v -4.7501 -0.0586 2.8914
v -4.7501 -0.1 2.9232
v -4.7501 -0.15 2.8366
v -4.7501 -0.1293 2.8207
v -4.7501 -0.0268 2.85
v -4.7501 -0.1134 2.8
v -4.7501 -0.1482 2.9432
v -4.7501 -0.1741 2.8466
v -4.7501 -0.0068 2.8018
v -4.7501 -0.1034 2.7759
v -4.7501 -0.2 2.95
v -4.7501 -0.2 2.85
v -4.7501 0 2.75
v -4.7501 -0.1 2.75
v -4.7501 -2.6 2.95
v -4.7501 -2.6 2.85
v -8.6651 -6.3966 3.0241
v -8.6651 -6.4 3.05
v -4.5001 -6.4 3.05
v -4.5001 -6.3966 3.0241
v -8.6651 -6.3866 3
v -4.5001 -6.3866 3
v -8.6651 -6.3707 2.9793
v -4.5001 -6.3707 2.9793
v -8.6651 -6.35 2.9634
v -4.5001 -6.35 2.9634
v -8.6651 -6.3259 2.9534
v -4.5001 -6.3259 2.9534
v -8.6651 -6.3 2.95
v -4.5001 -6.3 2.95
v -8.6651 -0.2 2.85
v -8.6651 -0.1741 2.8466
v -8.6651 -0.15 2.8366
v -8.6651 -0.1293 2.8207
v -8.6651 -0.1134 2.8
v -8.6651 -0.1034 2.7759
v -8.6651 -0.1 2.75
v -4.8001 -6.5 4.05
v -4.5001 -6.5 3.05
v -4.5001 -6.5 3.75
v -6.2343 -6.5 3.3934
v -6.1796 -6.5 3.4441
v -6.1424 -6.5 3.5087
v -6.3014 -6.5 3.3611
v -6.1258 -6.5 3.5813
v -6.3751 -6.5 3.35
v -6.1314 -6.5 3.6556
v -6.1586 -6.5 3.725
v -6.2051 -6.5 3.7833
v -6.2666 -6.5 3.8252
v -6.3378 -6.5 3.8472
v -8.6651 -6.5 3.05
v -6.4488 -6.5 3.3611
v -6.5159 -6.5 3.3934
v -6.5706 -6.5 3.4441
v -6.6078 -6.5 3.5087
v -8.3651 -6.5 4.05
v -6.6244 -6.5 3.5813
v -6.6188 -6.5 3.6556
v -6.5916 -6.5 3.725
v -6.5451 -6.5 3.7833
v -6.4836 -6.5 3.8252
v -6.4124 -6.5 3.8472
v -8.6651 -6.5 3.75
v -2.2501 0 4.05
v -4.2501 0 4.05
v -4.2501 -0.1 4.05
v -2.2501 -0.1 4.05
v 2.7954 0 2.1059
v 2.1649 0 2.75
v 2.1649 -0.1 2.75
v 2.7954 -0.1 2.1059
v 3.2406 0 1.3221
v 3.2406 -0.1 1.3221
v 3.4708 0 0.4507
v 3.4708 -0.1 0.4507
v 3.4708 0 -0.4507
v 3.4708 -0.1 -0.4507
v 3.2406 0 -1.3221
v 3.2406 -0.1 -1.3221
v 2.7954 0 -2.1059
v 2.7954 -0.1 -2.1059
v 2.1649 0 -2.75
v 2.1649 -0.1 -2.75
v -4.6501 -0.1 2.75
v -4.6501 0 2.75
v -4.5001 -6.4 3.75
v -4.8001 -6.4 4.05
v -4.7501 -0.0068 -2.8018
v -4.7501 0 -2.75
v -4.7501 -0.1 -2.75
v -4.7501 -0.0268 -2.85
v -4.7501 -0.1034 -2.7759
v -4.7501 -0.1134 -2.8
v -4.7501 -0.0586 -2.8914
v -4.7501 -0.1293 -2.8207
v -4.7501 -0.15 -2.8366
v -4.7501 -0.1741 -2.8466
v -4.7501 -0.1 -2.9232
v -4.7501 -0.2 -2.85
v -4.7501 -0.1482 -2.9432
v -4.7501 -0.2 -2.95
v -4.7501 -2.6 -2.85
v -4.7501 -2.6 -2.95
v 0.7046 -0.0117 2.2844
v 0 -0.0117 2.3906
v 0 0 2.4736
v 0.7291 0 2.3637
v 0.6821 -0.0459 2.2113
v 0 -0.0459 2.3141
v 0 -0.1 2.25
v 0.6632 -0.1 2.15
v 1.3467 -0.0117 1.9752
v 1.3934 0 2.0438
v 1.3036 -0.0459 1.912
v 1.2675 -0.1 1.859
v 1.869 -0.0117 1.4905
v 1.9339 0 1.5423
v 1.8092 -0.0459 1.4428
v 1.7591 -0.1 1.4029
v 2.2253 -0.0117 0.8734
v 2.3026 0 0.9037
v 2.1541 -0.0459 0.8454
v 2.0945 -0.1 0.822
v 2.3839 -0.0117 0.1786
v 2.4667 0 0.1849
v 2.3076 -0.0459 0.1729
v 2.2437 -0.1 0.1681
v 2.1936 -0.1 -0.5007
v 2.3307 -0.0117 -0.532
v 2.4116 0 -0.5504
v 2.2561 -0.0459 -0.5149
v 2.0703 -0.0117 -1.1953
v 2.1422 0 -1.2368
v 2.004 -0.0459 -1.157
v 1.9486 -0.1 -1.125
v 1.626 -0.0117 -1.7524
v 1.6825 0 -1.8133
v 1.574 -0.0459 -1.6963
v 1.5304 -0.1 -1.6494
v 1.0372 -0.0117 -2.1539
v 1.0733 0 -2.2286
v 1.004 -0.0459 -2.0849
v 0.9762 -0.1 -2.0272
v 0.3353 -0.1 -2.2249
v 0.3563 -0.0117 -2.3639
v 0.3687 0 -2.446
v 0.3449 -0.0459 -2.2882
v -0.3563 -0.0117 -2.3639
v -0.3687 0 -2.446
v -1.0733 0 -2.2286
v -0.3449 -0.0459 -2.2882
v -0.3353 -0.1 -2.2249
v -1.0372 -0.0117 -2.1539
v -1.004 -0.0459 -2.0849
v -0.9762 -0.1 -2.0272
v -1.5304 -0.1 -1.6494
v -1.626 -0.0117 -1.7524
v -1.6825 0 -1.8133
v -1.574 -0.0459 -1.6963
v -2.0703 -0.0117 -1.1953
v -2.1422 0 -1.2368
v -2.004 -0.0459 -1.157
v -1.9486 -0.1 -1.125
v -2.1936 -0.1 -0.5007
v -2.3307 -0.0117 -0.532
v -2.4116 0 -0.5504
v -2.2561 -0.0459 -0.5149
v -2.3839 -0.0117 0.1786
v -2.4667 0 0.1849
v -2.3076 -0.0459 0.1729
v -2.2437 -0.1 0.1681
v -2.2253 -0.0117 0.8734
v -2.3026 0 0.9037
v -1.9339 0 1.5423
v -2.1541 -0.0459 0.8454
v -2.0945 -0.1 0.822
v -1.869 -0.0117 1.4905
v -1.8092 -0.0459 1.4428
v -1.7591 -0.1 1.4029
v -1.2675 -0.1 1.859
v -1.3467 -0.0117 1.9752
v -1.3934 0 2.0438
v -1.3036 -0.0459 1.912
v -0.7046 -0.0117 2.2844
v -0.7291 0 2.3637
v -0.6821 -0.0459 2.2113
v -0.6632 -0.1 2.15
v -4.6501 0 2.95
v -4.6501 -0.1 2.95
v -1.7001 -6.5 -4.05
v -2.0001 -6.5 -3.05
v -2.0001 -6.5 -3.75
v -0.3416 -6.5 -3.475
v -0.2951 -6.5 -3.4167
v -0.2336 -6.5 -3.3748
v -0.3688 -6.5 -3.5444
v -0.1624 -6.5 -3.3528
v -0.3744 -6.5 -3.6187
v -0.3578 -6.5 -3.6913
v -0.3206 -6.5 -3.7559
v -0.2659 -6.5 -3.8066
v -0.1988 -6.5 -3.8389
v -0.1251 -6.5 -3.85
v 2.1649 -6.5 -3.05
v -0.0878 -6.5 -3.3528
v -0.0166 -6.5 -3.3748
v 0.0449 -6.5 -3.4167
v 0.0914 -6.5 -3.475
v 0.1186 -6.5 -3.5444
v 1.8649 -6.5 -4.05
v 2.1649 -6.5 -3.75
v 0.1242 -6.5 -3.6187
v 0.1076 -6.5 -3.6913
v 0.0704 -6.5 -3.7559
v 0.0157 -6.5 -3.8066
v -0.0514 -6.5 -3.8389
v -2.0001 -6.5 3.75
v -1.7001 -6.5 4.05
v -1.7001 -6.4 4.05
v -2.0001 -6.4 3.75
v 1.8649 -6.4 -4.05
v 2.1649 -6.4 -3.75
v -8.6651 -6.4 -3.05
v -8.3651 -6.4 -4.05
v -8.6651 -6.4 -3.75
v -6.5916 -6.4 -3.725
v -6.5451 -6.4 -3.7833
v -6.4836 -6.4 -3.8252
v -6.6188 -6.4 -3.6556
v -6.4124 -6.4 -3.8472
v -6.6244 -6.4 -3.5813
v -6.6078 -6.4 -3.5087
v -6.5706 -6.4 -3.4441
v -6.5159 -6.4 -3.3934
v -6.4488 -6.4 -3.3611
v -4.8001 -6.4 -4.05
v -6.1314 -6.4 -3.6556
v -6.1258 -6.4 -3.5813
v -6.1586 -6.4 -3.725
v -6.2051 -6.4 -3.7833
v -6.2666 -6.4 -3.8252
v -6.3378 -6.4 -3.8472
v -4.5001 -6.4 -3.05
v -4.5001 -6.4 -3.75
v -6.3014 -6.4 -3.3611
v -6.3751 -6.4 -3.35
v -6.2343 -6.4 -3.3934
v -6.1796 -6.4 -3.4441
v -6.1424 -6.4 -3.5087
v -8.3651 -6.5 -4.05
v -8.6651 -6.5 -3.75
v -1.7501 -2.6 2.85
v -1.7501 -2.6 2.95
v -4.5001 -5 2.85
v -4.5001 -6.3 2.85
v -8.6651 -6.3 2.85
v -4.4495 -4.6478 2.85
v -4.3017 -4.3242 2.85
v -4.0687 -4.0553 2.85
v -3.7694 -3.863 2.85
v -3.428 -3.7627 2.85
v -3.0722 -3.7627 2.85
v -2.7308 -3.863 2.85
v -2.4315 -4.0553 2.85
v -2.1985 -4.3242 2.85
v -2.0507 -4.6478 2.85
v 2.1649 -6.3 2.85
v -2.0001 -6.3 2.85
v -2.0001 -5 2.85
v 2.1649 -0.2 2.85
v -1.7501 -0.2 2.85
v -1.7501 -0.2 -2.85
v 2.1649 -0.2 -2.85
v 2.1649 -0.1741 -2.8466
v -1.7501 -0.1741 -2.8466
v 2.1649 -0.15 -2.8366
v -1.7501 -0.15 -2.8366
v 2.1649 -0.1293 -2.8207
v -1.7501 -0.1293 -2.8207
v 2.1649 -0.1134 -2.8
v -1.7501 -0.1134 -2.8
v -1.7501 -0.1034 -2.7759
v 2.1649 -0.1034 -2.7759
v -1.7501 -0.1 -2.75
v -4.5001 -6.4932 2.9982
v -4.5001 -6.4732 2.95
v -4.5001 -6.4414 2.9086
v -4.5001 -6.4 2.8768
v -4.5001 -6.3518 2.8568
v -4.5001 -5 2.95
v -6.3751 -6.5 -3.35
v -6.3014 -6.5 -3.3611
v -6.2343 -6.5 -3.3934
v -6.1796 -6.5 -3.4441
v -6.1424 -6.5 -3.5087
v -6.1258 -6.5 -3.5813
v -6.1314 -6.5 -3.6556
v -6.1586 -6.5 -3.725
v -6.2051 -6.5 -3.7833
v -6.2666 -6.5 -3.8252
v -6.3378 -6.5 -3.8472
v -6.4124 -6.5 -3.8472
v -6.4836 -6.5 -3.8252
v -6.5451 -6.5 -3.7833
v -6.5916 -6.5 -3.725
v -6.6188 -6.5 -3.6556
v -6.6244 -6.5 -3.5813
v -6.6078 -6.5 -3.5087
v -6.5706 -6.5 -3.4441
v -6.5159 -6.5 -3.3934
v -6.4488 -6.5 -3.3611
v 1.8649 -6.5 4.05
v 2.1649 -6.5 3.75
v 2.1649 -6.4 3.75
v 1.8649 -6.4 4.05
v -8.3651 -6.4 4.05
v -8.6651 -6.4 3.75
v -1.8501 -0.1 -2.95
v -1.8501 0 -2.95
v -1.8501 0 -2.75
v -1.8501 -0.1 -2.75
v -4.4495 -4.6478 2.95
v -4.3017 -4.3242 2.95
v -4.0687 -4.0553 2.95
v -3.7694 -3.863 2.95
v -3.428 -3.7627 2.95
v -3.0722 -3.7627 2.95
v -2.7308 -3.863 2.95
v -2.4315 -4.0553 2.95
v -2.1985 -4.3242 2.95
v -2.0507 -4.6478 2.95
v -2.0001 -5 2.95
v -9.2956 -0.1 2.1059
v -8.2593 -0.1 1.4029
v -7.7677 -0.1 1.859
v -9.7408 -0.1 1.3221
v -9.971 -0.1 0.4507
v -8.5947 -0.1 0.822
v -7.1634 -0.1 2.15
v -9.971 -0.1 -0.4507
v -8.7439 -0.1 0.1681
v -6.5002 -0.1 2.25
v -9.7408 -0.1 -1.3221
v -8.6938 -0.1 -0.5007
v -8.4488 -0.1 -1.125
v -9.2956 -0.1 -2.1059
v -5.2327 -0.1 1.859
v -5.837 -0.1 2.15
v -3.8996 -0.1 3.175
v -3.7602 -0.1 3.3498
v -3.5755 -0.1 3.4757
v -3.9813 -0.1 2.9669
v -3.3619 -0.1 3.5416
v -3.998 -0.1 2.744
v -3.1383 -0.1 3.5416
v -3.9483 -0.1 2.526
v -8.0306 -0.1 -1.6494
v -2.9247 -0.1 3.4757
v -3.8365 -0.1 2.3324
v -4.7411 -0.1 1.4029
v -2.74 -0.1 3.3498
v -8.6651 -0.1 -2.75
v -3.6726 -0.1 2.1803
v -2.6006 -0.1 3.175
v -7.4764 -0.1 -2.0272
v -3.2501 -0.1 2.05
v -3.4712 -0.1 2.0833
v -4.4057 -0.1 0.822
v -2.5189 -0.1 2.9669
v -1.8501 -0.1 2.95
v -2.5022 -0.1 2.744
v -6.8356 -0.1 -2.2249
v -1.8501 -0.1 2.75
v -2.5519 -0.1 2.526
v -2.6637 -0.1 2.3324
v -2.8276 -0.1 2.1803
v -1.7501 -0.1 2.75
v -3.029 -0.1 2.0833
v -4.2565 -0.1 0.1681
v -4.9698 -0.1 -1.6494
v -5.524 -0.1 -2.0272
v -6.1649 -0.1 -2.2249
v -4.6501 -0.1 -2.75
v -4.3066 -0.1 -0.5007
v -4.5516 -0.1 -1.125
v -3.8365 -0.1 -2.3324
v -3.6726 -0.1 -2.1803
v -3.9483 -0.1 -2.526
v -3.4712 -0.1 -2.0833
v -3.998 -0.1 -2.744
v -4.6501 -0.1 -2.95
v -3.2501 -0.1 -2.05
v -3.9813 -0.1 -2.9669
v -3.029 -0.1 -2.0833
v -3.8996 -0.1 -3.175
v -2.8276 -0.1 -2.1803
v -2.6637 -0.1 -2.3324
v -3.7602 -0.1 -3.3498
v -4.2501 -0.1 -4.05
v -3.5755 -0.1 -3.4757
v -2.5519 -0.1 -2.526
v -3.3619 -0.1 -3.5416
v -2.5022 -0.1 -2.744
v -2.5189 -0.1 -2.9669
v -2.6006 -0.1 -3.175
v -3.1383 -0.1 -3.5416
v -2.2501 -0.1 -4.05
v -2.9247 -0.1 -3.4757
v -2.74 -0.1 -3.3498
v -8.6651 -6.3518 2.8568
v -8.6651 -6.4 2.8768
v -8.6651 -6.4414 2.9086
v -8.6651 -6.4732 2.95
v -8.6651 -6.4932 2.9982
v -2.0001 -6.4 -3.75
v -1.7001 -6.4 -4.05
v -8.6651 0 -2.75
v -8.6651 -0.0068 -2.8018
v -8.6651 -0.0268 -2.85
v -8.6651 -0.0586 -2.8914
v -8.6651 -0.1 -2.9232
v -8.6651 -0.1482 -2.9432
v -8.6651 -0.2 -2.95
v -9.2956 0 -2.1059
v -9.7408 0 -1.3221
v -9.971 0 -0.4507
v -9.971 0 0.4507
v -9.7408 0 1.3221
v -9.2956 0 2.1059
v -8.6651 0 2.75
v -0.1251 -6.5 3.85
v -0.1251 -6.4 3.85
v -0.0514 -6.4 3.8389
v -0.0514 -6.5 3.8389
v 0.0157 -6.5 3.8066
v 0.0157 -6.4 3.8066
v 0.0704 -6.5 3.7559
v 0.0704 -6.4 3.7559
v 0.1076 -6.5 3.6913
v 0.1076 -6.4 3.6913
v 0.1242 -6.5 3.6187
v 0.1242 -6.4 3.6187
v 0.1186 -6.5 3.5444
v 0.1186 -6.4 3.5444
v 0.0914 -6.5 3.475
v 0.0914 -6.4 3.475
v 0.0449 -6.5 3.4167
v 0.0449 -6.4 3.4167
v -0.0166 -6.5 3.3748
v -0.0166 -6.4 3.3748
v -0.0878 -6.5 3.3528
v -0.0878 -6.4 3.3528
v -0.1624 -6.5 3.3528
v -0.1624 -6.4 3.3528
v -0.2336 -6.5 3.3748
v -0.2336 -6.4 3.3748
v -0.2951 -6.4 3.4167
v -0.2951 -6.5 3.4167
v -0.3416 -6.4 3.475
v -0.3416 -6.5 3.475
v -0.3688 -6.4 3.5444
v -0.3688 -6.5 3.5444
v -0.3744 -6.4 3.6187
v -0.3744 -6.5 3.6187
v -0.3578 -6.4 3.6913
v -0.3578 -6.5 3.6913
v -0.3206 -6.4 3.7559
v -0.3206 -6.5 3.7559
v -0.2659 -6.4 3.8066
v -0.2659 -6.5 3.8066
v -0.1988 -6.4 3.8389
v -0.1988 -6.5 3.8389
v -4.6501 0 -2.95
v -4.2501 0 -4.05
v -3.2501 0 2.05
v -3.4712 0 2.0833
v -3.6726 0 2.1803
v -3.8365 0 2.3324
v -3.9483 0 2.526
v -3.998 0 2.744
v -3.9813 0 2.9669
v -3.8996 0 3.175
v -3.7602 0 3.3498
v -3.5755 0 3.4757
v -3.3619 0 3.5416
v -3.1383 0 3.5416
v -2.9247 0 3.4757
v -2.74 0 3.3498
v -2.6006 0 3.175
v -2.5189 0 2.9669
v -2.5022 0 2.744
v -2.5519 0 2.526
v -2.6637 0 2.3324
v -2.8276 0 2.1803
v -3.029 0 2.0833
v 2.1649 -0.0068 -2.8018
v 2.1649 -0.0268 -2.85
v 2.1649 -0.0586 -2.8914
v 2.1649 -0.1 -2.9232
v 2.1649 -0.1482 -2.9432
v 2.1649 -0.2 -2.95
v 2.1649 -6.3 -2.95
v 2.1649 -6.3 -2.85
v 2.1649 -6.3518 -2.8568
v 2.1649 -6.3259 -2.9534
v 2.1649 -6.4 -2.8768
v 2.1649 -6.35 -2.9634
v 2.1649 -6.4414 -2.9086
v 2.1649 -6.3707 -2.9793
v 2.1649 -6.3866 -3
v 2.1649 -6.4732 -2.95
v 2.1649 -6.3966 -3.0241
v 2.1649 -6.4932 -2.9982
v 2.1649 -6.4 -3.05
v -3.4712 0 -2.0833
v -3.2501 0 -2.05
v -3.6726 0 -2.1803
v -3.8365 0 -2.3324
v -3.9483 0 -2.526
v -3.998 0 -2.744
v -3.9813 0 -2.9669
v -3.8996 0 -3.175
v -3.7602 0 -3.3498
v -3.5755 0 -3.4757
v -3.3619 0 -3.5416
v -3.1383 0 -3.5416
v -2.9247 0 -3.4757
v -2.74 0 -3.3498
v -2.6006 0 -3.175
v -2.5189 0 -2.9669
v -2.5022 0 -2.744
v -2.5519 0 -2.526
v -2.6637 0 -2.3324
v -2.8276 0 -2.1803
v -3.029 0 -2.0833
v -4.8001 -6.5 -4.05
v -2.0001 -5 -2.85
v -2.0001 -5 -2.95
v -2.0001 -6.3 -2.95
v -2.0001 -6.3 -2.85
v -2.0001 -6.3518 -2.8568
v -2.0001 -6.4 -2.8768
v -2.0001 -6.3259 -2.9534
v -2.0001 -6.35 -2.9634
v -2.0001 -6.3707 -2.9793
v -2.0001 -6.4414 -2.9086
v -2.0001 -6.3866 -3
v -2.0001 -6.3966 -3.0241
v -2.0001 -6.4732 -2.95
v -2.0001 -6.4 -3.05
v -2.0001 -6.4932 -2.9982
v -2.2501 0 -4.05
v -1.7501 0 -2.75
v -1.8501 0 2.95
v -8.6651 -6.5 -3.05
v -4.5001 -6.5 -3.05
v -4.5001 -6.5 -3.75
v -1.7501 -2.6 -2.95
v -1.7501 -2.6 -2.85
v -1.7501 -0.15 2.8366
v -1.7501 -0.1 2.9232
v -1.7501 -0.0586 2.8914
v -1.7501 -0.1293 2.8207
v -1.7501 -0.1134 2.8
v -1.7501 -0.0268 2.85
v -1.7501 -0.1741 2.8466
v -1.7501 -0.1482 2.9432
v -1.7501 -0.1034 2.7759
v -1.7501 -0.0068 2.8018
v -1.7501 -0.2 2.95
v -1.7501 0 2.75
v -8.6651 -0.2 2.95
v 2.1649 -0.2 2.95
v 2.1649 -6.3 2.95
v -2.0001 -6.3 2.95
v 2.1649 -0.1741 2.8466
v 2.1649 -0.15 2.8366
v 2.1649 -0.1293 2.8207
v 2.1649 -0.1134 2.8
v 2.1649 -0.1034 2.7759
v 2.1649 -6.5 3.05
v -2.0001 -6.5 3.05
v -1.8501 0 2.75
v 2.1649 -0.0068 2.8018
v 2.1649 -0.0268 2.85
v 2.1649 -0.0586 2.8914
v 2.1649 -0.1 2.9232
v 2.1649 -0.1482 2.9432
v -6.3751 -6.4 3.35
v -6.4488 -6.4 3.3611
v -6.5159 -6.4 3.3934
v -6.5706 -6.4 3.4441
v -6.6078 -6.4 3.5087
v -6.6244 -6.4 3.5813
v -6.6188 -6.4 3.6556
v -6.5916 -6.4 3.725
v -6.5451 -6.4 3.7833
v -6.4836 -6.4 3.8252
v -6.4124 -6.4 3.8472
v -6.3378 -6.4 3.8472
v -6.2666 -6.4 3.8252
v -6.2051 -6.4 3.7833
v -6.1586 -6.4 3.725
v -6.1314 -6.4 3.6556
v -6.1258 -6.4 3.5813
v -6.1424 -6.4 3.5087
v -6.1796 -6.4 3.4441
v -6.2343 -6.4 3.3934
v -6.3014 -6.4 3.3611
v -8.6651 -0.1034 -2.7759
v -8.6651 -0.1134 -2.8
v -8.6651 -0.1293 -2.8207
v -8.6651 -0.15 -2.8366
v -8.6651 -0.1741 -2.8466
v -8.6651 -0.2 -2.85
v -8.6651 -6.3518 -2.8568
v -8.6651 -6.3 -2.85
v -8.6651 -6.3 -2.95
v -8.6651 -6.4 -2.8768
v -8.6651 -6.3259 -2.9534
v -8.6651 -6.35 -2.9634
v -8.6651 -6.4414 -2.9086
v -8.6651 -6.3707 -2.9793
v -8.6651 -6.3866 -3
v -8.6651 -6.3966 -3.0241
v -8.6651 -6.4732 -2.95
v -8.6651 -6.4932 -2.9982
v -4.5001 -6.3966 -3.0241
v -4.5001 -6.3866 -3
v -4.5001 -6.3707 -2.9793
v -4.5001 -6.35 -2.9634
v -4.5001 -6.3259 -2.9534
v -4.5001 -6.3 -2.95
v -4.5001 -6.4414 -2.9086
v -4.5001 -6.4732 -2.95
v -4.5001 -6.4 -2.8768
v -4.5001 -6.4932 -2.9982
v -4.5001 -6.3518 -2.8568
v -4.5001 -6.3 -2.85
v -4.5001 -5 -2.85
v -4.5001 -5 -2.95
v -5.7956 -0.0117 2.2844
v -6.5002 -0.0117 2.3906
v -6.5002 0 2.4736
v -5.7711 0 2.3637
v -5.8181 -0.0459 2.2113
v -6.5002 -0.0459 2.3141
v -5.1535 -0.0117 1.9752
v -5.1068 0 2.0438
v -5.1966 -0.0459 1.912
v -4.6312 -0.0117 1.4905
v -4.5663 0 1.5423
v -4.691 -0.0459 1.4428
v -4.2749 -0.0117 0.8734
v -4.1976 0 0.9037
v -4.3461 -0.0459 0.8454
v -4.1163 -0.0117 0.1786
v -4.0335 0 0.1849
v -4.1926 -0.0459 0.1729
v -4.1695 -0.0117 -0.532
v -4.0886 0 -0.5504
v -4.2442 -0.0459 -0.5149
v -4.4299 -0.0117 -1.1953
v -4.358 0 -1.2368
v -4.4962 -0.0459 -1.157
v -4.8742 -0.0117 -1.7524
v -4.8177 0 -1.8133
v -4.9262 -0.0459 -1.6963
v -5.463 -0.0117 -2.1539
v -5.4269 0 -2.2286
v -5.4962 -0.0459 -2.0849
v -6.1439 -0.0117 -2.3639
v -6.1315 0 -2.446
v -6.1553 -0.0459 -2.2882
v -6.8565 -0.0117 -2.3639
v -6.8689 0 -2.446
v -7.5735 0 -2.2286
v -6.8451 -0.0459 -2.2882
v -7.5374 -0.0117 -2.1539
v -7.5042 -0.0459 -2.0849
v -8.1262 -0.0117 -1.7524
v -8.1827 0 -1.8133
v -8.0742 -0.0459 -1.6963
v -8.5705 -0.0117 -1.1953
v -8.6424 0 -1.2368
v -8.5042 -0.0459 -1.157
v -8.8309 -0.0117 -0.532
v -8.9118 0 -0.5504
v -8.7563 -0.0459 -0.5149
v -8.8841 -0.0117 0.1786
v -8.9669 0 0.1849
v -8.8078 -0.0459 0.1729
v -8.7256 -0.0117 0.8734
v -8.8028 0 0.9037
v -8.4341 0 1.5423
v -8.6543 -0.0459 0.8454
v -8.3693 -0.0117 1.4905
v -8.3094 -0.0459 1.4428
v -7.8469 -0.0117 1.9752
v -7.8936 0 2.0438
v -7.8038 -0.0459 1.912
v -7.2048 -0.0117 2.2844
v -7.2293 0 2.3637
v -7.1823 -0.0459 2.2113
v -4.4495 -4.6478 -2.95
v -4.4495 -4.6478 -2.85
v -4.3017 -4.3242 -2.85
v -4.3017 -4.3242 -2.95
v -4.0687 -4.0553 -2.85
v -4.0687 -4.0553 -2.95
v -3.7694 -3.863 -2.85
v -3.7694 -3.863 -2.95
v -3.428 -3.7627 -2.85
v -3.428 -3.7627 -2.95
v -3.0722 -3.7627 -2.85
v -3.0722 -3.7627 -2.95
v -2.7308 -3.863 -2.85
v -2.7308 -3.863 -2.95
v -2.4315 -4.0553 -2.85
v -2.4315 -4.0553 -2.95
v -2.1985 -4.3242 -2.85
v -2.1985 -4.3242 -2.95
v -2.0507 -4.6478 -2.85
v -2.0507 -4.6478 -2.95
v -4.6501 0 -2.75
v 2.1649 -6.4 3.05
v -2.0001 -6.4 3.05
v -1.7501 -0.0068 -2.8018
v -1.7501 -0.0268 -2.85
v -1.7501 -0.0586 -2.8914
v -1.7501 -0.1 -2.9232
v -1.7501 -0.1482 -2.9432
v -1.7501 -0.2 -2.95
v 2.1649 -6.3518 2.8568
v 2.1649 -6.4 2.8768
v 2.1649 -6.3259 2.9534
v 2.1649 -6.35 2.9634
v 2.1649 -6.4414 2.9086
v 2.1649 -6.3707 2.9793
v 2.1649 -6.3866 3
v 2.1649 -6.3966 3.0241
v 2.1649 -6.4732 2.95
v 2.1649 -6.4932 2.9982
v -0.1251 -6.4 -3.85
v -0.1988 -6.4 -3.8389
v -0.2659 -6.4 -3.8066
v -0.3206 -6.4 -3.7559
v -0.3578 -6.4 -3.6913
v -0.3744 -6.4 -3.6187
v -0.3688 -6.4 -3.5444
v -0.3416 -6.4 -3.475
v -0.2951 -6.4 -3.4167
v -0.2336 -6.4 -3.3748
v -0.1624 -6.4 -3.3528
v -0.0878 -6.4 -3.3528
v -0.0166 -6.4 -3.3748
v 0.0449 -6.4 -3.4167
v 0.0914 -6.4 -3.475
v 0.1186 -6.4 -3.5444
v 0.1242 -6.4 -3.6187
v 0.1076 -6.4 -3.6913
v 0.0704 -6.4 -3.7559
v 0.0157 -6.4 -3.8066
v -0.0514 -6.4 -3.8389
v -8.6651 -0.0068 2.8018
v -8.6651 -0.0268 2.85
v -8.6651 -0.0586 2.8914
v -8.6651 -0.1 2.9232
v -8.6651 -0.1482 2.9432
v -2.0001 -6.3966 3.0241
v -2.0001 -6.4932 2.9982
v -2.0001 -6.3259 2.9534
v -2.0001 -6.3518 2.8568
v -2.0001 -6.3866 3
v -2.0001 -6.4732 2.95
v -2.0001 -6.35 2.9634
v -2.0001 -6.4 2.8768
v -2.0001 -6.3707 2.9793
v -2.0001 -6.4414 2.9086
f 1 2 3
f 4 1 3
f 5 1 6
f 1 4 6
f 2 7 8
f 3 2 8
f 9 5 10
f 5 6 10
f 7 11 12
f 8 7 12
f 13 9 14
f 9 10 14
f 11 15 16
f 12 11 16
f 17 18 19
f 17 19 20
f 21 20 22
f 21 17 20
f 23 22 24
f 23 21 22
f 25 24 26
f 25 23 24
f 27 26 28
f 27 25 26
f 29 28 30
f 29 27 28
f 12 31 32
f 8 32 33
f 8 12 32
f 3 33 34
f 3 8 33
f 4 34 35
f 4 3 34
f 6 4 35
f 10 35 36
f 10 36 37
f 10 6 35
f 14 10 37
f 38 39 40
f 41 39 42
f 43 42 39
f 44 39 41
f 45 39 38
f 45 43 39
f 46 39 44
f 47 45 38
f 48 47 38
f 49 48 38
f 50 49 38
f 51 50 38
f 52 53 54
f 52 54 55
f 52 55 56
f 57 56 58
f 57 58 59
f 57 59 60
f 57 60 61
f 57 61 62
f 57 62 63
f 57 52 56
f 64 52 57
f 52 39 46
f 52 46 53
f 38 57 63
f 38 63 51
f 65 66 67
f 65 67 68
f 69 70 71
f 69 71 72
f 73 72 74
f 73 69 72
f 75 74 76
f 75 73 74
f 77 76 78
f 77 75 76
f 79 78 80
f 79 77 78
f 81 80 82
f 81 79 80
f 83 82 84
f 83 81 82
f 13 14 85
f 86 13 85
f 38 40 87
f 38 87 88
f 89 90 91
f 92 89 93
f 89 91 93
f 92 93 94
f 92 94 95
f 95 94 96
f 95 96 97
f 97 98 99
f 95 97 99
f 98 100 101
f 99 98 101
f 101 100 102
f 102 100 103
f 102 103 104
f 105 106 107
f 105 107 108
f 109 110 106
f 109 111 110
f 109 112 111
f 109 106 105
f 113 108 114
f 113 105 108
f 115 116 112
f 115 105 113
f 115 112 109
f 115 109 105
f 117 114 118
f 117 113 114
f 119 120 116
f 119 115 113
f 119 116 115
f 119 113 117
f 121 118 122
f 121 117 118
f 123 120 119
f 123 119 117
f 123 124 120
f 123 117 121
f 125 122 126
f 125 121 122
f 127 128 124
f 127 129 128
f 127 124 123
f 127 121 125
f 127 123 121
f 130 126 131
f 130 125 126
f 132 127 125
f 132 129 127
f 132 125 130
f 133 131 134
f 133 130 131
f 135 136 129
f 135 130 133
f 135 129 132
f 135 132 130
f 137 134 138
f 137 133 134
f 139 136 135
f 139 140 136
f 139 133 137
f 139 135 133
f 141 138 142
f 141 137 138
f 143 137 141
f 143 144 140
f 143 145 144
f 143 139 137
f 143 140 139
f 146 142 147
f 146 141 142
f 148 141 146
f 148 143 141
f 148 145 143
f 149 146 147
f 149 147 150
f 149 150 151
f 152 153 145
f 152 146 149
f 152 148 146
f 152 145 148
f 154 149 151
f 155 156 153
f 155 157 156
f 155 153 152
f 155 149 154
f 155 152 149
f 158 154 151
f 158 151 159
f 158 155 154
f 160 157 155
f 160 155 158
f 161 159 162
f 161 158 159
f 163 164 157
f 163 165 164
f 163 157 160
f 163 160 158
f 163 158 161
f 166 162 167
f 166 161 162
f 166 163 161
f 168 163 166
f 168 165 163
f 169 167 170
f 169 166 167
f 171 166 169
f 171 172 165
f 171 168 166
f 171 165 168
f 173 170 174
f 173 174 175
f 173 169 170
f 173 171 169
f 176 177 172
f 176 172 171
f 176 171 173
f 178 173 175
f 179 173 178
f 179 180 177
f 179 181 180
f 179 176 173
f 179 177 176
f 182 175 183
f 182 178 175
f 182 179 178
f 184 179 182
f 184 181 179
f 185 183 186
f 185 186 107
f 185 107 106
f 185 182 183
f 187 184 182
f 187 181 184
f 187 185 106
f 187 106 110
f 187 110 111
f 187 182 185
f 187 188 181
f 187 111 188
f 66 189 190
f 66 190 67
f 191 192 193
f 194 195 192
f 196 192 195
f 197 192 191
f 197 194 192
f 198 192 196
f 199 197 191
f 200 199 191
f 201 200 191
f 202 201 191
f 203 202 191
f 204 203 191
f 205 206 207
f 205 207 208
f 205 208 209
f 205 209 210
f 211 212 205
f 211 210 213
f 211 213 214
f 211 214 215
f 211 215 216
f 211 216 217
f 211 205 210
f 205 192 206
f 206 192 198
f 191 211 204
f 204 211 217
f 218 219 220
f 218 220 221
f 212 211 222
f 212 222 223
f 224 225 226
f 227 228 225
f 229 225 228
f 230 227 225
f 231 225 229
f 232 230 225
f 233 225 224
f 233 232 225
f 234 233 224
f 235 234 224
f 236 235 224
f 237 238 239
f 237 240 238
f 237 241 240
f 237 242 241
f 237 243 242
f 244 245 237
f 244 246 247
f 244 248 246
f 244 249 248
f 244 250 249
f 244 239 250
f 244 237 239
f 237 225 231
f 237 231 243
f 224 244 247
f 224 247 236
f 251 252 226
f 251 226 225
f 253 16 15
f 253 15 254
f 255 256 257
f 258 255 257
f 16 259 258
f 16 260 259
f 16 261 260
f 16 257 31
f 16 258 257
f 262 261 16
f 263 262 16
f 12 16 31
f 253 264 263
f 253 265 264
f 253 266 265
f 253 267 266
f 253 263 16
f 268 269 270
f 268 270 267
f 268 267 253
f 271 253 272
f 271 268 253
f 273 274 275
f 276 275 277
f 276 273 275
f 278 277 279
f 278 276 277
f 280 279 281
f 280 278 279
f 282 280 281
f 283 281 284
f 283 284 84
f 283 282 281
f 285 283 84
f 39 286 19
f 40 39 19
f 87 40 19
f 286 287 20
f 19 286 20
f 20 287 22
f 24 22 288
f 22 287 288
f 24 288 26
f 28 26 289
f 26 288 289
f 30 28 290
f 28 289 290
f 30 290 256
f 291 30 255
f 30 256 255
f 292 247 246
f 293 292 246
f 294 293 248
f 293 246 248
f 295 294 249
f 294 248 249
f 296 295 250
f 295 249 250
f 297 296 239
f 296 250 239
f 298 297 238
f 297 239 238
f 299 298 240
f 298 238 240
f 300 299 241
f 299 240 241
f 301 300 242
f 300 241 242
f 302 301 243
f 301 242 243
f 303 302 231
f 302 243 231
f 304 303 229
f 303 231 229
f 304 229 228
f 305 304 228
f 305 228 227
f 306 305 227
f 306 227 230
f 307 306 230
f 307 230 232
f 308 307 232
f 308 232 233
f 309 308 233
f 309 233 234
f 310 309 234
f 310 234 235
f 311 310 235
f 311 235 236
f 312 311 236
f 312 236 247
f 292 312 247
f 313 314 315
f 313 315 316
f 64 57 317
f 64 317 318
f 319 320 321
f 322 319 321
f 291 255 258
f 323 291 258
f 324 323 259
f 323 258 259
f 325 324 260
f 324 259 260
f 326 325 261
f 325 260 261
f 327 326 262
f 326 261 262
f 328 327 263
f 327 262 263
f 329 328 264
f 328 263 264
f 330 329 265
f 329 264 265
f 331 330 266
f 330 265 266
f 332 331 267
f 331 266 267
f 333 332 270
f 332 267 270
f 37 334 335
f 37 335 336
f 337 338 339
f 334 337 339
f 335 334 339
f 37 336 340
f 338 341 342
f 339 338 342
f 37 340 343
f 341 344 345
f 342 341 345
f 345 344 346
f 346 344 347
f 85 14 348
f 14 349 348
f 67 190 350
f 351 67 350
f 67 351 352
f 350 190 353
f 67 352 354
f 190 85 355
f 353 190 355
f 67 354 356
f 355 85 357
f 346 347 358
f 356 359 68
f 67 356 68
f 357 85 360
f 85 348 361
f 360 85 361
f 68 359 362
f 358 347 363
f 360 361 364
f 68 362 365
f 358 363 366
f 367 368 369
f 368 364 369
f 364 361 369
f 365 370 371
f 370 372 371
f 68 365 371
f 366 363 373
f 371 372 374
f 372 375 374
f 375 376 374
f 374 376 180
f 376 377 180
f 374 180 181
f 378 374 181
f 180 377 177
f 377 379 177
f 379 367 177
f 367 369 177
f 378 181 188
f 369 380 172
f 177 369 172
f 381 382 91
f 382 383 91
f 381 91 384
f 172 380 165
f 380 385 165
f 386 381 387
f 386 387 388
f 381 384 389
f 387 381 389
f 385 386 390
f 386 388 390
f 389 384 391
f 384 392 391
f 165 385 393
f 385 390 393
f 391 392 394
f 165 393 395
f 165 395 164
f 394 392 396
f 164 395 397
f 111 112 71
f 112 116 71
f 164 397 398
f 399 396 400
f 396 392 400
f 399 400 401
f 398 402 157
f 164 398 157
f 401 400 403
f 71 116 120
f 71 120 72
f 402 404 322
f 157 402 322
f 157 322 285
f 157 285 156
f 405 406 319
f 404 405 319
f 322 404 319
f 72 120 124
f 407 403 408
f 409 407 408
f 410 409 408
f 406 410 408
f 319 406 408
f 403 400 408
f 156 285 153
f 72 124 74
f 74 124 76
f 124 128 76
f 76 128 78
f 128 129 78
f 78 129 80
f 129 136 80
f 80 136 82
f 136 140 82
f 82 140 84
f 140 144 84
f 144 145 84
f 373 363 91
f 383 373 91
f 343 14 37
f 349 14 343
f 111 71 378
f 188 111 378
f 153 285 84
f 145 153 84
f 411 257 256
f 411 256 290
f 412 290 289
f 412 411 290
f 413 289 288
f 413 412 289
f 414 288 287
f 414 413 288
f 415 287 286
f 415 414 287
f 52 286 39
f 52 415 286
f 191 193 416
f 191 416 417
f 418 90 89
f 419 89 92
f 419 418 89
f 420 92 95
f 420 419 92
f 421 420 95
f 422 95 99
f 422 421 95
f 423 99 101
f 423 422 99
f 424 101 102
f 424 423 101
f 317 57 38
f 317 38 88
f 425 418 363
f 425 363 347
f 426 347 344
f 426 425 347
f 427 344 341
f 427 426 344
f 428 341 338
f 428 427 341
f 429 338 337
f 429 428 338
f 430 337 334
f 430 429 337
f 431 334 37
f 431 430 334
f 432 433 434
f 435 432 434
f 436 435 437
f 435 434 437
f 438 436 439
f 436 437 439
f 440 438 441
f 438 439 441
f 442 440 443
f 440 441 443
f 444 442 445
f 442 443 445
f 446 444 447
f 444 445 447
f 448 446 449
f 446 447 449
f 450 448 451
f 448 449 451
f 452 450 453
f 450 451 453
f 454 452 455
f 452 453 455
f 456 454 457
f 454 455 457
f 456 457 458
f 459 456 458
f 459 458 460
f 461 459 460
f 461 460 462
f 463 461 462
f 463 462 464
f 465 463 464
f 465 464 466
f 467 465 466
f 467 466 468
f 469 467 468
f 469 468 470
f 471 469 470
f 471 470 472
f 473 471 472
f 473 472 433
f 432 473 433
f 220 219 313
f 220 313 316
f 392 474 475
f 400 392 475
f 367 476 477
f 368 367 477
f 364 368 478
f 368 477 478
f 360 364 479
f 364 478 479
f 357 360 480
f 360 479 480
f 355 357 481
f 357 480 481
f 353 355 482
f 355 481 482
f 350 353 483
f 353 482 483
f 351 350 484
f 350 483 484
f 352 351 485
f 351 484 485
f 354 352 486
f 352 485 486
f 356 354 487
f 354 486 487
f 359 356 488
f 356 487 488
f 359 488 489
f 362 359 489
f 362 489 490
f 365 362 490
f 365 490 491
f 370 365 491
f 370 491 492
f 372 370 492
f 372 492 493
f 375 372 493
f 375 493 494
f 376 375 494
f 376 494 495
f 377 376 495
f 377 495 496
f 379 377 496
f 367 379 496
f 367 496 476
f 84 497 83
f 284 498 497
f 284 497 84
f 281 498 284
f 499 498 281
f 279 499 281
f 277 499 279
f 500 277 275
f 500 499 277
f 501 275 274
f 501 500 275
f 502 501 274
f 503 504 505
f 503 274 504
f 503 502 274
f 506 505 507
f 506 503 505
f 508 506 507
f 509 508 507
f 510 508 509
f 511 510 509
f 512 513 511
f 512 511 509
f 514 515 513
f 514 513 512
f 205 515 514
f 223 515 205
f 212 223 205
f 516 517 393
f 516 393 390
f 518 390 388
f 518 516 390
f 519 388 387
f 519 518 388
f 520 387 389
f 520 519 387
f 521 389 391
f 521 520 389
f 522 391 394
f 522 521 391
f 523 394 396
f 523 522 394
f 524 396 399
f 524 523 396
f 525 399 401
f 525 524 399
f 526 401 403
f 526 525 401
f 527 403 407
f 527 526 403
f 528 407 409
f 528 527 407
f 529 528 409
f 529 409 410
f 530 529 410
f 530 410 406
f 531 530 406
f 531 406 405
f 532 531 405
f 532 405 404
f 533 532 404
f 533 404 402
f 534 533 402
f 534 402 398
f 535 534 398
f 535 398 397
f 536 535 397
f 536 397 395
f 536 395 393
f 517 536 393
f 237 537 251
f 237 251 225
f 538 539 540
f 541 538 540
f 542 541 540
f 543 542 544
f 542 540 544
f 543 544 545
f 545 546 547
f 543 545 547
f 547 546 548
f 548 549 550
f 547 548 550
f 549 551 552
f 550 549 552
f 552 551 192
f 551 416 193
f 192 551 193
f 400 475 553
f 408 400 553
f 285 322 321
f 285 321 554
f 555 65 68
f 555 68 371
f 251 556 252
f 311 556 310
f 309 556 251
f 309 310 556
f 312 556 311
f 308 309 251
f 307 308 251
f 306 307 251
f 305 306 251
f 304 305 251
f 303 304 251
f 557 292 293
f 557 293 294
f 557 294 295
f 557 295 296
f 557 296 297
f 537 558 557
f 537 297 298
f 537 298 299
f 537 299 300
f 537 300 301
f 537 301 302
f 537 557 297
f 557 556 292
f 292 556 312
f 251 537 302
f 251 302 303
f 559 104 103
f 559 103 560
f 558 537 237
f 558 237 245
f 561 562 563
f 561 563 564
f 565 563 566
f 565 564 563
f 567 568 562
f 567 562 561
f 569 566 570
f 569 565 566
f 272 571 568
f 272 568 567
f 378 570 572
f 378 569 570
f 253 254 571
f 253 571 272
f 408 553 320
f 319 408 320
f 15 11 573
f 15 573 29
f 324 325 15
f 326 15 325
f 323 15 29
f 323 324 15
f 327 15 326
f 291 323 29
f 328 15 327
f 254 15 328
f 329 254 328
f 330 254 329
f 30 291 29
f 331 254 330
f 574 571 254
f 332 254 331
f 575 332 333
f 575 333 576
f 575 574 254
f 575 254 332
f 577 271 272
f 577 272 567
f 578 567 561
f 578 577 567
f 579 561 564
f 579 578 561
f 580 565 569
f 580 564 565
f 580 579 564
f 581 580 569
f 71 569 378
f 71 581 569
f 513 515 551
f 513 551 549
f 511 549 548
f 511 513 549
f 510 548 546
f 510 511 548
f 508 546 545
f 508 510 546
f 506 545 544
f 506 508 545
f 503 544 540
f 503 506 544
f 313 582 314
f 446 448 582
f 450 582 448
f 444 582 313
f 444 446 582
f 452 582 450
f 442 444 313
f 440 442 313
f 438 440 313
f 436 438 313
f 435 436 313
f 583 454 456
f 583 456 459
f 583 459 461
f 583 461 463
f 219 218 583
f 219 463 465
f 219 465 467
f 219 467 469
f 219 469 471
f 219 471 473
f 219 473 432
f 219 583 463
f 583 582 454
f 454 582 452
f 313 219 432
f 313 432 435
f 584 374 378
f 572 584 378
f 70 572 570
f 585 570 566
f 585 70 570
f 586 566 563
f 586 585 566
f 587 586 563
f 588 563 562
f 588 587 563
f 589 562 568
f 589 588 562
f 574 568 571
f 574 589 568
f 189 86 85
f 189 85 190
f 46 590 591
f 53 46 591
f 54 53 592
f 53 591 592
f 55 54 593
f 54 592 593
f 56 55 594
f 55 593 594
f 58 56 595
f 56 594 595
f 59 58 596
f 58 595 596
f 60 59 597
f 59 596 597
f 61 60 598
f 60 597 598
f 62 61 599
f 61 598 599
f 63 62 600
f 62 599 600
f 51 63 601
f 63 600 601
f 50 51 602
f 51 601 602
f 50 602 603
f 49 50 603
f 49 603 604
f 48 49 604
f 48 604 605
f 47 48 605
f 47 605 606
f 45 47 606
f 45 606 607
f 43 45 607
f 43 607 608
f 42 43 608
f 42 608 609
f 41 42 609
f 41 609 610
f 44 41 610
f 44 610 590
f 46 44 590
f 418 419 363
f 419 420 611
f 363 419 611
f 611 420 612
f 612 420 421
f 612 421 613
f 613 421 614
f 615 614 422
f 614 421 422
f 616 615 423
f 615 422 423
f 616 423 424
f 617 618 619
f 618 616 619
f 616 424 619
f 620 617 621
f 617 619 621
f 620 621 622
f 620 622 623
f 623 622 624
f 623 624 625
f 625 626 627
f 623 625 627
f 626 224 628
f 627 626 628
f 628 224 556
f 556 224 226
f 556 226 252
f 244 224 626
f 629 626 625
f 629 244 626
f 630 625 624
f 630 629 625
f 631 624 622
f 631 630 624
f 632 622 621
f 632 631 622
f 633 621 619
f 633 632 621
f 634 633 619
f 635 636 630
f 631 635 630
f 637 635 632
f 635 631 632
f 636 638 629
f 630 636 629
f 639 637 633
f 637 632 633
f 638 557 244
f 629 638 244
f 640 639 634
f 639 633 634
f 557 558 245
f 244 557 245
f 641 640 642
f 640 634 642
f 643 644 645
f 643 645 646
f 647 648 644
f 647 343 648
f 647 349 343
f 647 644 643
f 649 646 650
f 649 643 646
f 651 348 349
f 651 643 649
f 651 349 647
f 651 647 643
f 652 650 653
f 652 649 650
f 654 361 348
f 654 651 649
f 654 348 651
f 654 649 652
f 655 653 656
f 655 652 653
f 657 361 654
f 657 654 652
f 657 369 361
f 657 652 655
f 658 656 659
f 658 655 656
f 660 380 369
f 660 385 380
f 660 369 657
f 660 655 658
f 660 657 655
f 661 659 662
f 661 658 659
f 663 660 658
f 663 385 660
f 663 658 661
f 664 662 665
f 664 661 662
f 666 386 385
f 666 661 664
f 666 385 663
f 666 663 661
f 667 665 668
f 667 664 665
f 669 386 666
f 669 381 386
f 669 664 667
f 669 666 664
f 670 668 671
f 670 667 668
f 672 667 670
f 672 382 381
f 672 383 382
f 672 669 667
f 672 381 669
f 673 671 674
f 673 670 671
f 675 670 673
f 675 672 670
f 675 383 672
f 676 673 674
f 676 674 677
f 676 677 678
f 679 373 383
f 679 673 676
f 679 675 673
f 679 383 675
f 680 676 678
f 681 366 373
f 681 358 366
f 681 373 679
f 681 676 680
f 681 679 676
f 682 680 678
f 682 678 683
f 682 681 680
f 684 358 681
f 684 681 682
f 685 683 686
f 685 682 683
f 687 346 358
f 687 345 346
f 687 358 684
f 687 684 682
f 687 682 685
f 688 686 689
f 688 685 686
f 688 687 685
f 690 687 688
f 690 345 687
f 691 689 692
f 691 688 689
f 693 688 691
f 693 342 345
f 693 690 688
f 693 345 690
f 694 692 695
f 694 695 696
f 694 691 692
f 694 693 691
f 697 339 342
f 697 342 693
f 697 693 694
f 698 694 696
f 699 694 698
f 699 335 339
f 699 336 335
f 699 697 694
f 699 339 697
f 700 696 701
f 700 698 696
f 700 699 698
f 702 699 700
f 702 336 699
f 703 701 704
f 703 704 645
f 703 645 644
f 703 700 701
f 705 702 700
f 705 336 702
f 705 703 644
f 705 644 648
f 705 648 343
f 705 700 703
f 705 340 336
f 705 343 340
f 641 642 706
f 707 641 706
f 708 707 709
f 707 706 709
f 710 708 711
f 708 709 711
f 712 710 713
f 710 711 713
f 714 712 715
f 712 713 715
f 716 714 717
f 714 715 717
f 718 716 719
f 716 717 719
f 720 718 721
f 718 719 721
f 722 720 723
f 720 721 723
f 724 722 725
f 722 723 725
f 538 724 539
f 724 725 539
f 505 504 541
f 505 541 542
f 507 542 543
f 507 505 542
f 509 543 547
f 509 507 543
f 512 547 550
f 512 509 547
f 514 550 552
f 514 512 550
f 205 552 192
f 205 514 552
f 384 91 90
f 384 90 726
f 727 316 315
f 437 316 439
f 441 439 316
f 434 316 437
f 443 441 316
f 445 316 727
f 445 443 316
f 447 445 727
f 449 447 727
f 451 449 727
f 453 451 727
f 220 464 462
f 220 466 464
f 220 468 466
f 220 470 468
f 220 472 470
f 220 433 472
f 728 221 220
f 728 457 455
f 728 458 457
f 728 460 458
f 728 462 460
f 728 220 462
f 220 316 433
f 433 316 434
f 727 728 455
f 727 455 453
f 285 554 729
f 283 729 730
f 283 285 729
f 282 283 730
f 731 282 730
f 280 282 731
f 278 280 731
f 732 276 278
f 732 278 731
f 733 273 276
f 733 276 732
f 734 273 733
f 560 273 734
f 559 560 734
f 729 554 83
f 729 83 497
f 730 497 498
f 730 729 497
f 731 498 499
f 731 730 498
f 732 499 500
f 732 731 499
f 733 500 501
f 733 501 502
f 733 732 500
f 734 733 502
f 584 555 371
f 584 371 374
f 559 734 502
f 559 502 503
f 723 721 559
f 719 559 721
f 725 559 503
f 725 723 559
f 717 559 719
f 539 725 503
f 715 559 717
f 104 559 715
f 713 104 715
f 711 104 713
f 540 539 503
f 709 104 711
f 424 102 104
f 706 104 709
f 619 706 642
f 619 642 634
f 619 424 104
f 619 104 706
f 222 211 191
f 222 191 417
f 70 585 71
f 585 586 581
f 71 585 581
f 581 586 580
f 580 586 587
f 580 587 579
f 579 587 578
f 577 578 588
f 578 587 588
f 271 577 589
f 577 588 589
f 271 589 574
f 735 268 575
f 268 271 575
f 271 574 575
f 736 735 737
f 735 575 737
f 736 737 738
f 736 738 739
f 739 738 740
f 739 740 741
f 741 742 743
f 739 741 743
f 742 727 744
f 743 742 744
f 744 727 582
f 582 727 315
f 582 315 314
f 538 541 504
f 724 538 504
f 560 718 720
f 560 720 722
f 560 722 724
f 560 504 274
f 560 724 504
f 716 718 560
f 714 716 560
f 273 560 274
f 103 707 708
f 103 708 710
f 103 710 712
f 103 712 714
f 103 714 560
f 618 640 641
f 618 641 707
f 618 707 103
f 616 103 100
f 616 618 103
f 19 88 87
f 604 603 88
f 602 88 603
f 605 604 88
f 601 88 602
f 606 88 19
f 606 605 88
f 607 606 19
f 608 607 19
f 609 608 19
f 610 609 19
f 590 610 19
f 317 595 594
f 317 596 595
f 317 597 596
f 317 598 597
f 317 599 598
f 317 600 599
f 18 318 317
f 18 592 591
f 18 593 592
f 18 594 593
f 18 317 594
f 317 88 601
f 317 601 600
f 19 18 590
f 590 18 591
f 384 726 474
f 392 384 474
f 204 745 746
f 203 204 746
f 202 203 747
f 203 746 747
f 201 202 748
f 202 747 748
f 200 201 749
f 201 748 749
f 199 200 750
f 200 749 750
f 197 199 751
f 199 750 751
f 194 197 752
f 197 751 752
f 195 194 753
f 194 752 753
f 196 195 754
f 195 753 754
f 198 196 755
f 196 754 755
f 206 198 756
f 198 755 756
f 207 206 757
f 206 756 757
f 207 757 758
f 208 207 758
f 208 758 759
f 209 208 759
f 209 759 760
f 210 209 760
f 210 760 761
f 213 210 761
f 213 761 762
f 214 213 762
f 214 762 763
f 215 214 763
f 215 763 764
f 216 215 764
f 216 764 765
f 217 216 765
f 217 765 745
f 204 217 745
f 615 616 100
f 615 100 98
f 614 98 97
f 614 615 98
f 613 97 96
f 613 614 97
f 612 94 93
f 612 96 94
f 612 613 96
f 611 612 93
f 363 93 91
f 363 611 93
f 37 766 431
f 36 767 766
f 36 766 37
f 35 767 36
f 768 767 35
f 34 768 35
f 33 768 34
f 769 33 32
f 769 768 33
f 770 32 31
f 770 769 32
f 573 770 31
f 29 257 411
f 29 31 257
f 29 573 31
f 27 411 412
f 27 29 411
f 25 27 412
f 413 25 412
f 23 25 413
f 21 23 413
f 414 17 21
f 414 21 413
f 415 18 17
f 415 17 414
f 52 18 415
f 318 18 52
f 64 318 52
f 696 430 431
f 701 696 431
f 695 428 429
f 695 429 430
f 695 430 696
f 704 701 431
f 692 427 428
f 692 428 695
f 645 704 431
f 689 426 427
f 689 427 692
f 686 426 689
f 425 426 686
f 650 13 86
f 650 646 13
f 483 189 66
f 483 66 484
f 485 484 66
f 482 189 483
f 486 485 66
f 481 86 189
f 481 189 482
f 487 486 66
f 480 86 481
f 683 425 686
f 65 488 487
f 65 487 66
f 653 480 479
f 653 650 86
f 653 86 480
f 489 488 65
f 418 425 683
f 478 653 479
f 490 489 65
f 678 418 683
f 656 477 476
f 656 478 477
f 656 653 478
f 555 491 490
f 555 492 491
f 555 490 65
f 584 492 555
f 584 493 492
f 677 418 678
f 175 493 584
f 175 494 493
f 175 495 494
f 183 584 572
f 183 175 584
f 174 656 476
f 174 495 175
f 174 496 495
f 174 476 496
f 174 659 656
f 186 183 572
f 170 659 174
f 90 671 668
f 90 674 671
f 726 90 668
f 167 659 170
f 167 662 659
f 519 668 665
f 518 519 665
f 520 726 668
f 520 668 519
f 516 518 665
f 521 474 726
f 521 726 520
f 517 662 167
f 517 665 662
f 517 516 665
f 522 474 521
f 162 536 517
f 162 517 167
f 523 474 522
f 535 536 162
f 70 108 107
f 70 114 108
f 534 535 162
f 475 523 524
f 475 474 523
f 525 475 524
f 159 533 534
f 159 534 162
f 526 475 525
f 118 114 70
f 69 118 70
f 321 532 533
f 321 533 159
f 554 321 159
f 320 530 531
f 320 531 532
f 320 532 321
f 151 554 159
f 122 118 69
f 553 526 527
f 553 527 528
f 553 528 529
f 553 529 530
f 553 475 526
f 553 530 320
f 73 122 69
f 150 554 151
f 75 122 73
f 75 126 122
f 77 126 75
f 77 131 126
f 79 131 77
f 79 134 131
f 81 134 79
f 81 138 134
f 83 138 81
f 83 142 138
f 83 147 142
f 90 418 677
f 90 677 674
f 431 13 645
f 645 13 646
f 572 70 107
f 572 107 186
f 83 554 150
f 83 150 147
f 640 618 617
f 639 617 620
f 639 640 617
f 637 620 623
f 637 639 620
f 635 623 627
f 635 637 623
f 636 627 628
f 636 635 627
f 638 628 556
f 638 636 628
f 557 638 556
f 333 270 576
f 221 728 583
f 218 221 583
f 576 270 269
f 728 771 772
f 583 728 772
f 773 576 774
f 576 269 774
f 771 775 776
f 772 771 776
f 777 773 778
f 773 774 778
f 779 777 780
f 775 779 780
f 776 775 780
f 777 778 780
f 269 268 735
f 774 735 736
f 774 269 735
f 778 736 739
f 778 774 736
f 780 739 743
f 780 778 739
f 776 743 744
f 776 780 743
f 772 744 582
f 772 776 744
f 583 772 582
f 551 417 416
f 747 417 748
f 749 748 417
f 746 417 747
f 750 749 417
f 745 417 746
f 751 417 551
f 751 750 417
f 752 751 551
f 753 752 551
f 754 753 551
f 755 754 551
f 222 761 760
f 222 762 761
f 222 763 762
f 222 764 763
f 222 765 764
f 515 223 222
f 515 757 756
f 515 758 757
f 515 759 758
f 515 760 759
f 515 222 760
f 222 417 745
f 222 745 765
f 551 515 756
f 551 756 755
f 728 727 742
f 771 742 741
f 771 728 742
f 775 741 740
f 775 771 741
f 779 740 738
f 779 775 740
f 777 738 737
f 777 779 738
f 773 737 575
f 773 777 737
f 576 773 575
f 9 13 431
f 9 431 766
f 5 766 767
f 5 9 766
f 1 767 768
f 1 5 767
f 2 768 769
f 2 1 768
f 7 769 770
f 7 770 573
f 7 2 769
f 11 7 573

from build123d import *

# Parameters (mm, degrees)
SKETCH1_R                      = 2.25
BASE_FLANGE1_DEPTH             = 0.1
EDGE_FLANGE1_STRIP_W           = 0.6
EDGE_FLANGE1_STRIP_H           = 0.1
EDGE_FLANGE1_STRIP_CUT_DEPTH   = 10.83
EDGE_FLANGE1_STRIP_2_W         = 0.6
EDGE_FLANGE1_STRIP_2_H         = 0.1
EDGE_FLANGE1_STRIP_CUT_2_DEPTH = 10.83
EDGE_FLANGE1_DEPTH             = 10.83
EDGE_FLANGE1_BEND_DEPTH        = 10.83
EDGE_FLANGE2_STRIP_W           = 0.6
EDGE_FLANGE2_STRIP_H           = 0.1
EDGE_FLANGE2_STRIP_CUT_DEPTH   = 10.83
EDGE_FLANGE2_STRIP_2_W         = 0.6
EDGE_FLANGE2_STRIP_2_H         = 0.1
EDGE_FLANGE2_STRIP_CUT_2_DEPTH = 10.83
EDGE_FLANGE2_DEPTH             = 10.83
EDGE_FLANGE2_BEND_DEPTH        = 10.83
CUT_EXTRUDE1_DEPTH             = 13.595815176
CUT_EXTRUDE1_DEPTH_BACK        = 13.595815176
CUT_EXTRUDE2_START             = -2.6
CUT_EXTRUDE2_OUTLINE_W         = 3
CUT_EXTRUDE2_OUTLINE_H         = 0.2
CUT_EXTRUDE2_DEPTH             = 2.6
TAB1_DEPTH                     = 0.1
CUT_EXTRUDE3_REACH             = 14.596
SKETCH23_R                     = 0.75
CUT_EXTRUDE3_DIRECTION_2_DEPTH = 13.595815176
BREAK_CORNER1_START            = -6.5
BREAK_CORNER1_DEPTH            = 0.1
FILLET1_R                      = 0.3
SKETCH24_R                     = 0.25
CUT_EXTRUDE4_DEPTH             = 10


# Read off the part's stored shape, not the designer's step: Cut-Extrude2, Break-Corner1
# Sheet-metal steps are written as plain solids
with BuildPart() as part:
    # Sketch1 → Base-Flange1 (new body)
    with BuildSketch(Plane(origin=(0, 0, 0), x_dir=(1, 0, 0), z_dir=(0, 1, 0))):
        with BuildLine():
            Line((-8.665102996, -2.95), (2.164897004, -2.95))
            Line((2.164897004, -2.95), (2.164897004, -2.75))
            ThreePointArc((2.164897004, -2.75), (3.499897004, 0), (2.164897004, 2.75))
            Line((2.164897004, 2.75), (2.164897004, 2.95))
            Line((2.164897004, 2.95), (-8.665102996, 2.95))
            Line((-8.665102996, 2.95), (-8.665102996, 2.75))
            ThreePointArc((-8.665102996, 2.75), (-10.000102996, 0), (-8.665102996, -2.75))
            Line((-8.665102996, -2.75), (-8.665102996, -2.95))
        make_face()
        with Locations(Location((0, 0, 0), (0, 0, 270))):
            Circle(SKETCH1_R, mode=Mode.SUBTRACT)
        with Locations(Location((-6.500205993, 0, 0), (0, 0, 270))):
            Circle(SKETCH1_R, mode=Mode.SUBTRACT)
    extrude(amount=-BASE_FLANGE1_DEPTH)

    # Edge-Flange1 strip (across the edge) → Edge-Flange1 strip cut (cut)
    with BuildSketch(Plane(origin=(2.164897004, -0.1, 2.95), x_dir=(0, 0, -1), z_dir=(-1, 0, 0))):
        with Locations((-0.1, -0.05)):
            Rectangle(EDGE_FLANGE1_STRIP_W, EDGE_FLANGE1_STRIP_H)
    extrude(amount=EDGE_FLANGE1_STRIP_CUT_DEPTH, mode=Mode.SUBTRACT)

    # Edge-Flange1 strip 2 (across the edge) → Edge-Flange1 strip cut 2 (cut)
    with BuildSketch(Plane(origin=(-8.665102996, -0.1, -2.95), x_dir=(0, 0, 1), z_dir=(1, 0, 0))):
        with Locations((-0.1, -0.05)):
            Rectangle(EDGE_FLANGE1_STRIP_2_W, EDGE_FLANGE1_STRIP_2_H)
    extrude(amount=EDGE_FLANGE1_STRIP_CUT_2_DEPTH, mode=Mode.SUBTRACT)

    # Edge-Flange1 section (across the edge) → Edge-Flange1 (add)
    with BuildSketch(Plane(origin=(2.164897004, -0.1, 2.95), x_dir=(0, 0, -1), z_dir=(-1, 0, 0))):
        with BuildLine():
            Line((0, 0.1), (0, 6.4))
            Line((0, 6.4), (0.1, 6.4))
            Line((0.1, 6.4), (0.1, 0.1))
            ThreePointArc((0.1, 0.1), (0.129289322, 0.029289322), (0.2, 0))
            Line((0.2, 0), (0.2, -0.1))
            ThreePointArc((0.2, -0.1), (0.058578644, -0.041421356), (0, 0.1))
        make_face()
    extrude(amount=EDGE_FLANGE1_DEPTH)

    # Edge-Flange1 section 2 (across the edge) → Edge-Flange1 bend (add)
    with BuildSketch(Plane(origin=(-8.665102996, -0.1, -2.95), x_dir=(0, 0, 1), z_dir=(1, 0, 0))):
        with BuildLine():
            Line((0, 0.1), (0, 6.4))
            Line((0, 6.4), (0.1, 6.4))
            Line((0.1, 6.4), (0.1, 0.1))
            ThreePointArc((0.1, 0.1), (0.129289322, 0.029289322), (0.2, 0))
            Line((0.2, 0), (0.2, -0.1))
            ThreePointArc((0.2, -0.1), (0.058578644, -0.041421356), (0, 0.1))
        make_face()
    extrude(amount=EDGE_FLANGE1_BEND_DEPTH)

    # Edge-Flange2 strip (across the edge) → Edge-Flange2 strip cut (cut)
    with BuildSketch(Plane(origin=(-8.665102996, -6.5, 2.95), x_dir=(0, 1, 0), z_dir=(1, 0, 0))):
        with Locations((-0.1, -0.05)):
            Rectangle(EDGE_FLANGE2_STRIP_W, EDGE_FLANGE2_STRIP_H)
    extrude(amount=EDGE_FLANGE2_STRIP_CUT_DEPTH, mode=Mode.SUBTRACT)

    # Edge-Flange2 strip 2 (across the edge) → Edge-Flange2 strip cut 2 (cut)
    with BuildSketch(Plane(origin=(2.164897004, -6.5, -2.95), x_dir=(0, 1, 0), z_dir=(-1, 0, 0))):
        with Locations((-0.1, -0.05)):
            Rectangle(EDGE_FLANGE2_STRIP_2_W, EDGE_FLANGE2_STRIP_2_H)
    extrude(amount=EDGE_FLANGE2_STRIP_CUT_2_DEPTH, mode=Mode.SUBTRACT)

    # Edge-Flange2 section (across the edge) → Edge-Flange2 (add)
    with BuildSketch(Plane(origin=(-8.665102996, -6.5, 2.95), x_dir=(0, 1, 0), z_dir=(1, 0, 0))):
        with BuildLine():
            Line((0, 0.1), (0, 1.1))
            Line((0, 1.1), (0.1, 1.1))
            Line((0.1, 1.1), (0.1, 0.1))
            ThreePointArc((0.1, 0.1), (0.129289322, 0.029289322), (0.2, 0))
            Line((0.2, 0), (0.2, -0.1))
            ThreePointArc((0.2, -0.1), (0.058578644, -0.041421356), (0, 0.1))
        make_face()
    extrude(amount=EDGE_FLANGE2_DEPTH)

    # Edge-Flange2 section 2 (across the edge) → Edge-Flange2 bend (add)
    with BuildSketch(Plane(origin=(2.164897004, -6.5, -2.95), x_dir=(0, 1, 0), z_dir=(-1, 0, 0))):
        with BuildLine():
            Line((0, 0.1), (0, 1.1))
            Line((0, 1.1), (0.1, 1.1))
            Line((0.1, 1.1), (0.1, 0.1))
            ThreePointArc((0.1, 0.1), (0.129289322, 0.029289322), (0.2, 0))
            Line((0.2, 0), (0.2, -0.1))
            ThreePointArc((0.2, -0.1), (0.058578644, -0.041421356), (0, 0.1))
        make_face()
    extrude(amount=EDGE_FLANGE2_BEND_DEPTH)

    # Sketch18 → Cut-Extrude1 (cut, two sides: drawn at the far end of the back side and taken through both)
    with BuildSketch(Plane.XY.offset(-CUT_EXTRUDE1_DEPTH_BACK)):
        with BuildLine():
            Line((-4.500102996, -6.5), (-4.500102996, -5))
            ThreePointArc((-4.500102996, -5), (-3.250102996, -3.75), (-2.000102996, -5))
            Line((-2.000102996, -5), (-2.000102996, -6.5))
            Line((-2.000102996, -6.5), (-4.500102996, -6.5))
        make_face()
    extrude(amount=CUT_EXTRUDE1_DEPTH + CUT_EXTRUDE1_DEPTH_BACK, mode=Mode.SUBTRACT)

    # Cut-Extrude2 outline → Cut-Extrude2 (cut)
    with BuildSketch(Plane(origin=(0, 0, 0), x_dir=(1, 0, 0), z_dir=(0, 1, 0)).offset(CUT_EXTRUDE2_START)):
        with Locations((-3.250102996, 2.85)):
            Rectangle(CUT_EXTRUDE2_OUTLINE_W, CUT_EXTRUDE2_OUTLINE_H)
        with Locations((-3.250102996, -2.85)):
            Rectangle(CUT_EXTRUDE2_OUTLINE_W, CUT_EXTRUDE2_OUTLINE_H)
    extrude(amount=CUT_EXTRUDE2_DEPTH, mode=Mode.SUBTRACT)

    # Sketch20 → Tab1 (add)
    with BuildSketch(Plane(origin=(0, 0, 0), x_dir=(1, 0, 0), z_dir=(0, 1, 0))):
        Polygon((-4.650102996, -2.75), (-4.650102996, -2.95), (-4.250102996, -4.05), (-2.250102996, -4.05), (-1.850102996, -2.95), (-1.850102996, -2.75), align=None)
    tab1 = extrude(amount=-TAB1_DEPTH)

    # Sketch23 → Cut-Extrude3 (cut, up to next)
    with BuildSketch(Plane(origin=(0, 0, 0), x_dir=(1, 0, 0), z_dir=(0, 1, 0)), mode=Mode.PRIVATE) as cut_extrude3_sk1:
        with Locations(Location((-3.250102996, -2.8, 0), (0, 0, 90))):
            Circle(SKETCH23_R)
    cut_extrude3_tool1 = extrude(cut_extrude3_sk1.sketch, amount=-CUT_EXTRUDE3_REACH, mode=Mode.PRIVATE) & part.part
    cut_extrude3 = cut_extrude3_tool1.solids().sort_by_distance((-3.250103, 0, 2.8))[0]
    add(cut_extrude3, mode=Mode.SUBTRACT)

    # Sketch23 → Cut-Extrude3 direction 2 (cut)
    with BuildSketch(Plane(origin=(0, 0, 0), x_dir=(1, 0, 0), z_dir=(0, 1, 0))):
        with Locations(Location((-3.250102996, -2.8, 0), (0, 0, 90))):
            Circle(SKETCH23_R)
    cut_extrude3_direction_2 = extrude(amount=CUT_EXTRUDE3_DIRECTION_2_DEPTH, mode=Mode.SUBTRACT)

    # Mirror1: Tab1, Cut-Extrude3, Cut-Extrude3 direction 2 across plane
    add(tab1.mirror(Plane.XY))
    add(cut_extrude3.mirror(Plane.XY), mode=Mode.SUBTRACT)
    add(cut_extrude3_direction_2.mirror(Plane.XY), mode=Mode.SUBTRACT)

    # Break-Corner1 outline → Break-Corner1 (cut)
    with BuildSketch(Plane(origin=(0, 0, 0), x_dir=(1, 0, 0), z_dir=(0, 1, 0)).offset(BREAK_CORNER1_START)):
        Polygon((-2.000102996, -4.05), (-1.700102996, -4.05), (-2.000102996, -3.75), align=None)
        Polygon((2.164897004, -3.75), (1.864897004, -4.05), (2.164897004, -4.05), align=None)
        Polygon((-4.500102996, -4.05), (-4.500102996, -3.75), (-4.800102996, -4.05), align=None)
        Polygon((-8.665102996, -4.05), (-8.365102996, -4.05), (-8.665102996, -3.75), align=None)
        Polygon((-2.000102996, 4.05), (-2.000102996, 3.75), (-1.700102996, 4.05), align=None)
        Polygon((2.164897004, 4.05), (1.864897004, 4.05), (2.164897004, 3.75), align=None)
        Polygon((-4.500102996, 4.05), (-4.800102996, 4.05), (-4.500102996, 3.75), align=None)
        Polygon((-8.665102996, 3.75), (-8.365102996, 4.05), (-8.665102996, 4.05), align=None)
    extrude(amount=BREAK_CORNER1_DEPTH, mode=Mode.SUBTRACT)

    # Fillet1
    # the kernel refuses this fillet: 0.3 mm, written as the material it takes off along each edge
    with BuildSketch(Plane(origin=(0, 0, 0), x_dir=(0, 0, 1), z_dir=(-1, 0, 0))) as fillet1_piece_1:
        with BuildLine():
            CenterArc((2.473606798, -0.3), FILLET1_R, 90, 48.189685104)
            Line((2.25, -0.1), (2.245527864, -0.096))
            ThreePointArc((2.245527864, -0.096), (2.244, -0.05), (2.244, 0))
            Line((2.244, 0), (2.25, 0.006))
            Line((2.25, 0.006), (2.473606798, 0.006))
            Line((2.473606798, 0.006), (2.473606798, 0))
        make_face()
    revolve(axis=Axis((0, 0, 0), (0, 1, 0)), mode=Mode.SUBTRACT)
    with BuildSketch(Plane(origin=(-6.500205993, 0, 0), x_dir=(0, 0, 1), z_dir=(-1, 0, 0))) as fillet1_piece_2:
        with BuildLine():
            CenterArc((2.473606798, -0.3), FILLET1_R, 90, 48.189685104)
            Line((2.25, -0.1), (2.245527864, -0.096))
            ThreePointArc((2.245527864, -0.096), (2.244, -0.05), (2.244, 0))
            Line((2.244, 0), (2.25, 0.006))
            Line((2.25, 0.006), (2.473606798, 0.006))
            Line((2.473606798, 0.006), (2.473606798, 0))
        make_face()
    revolve(axis=Axis((-6.500205993, 0, 0), (0, 1, 0)), mode=Mode.SUBTRACT)

    # Sketch24 → Cut-Extrude4 (cut)
    with BuildSketch(Plane(origin=(0, -6.4, 0), x_dir=(1, 0, 0), z_dir=(0, 1, 0))):
        with Locations(Location((-6.375102996, 3.6, 0), (0, 0, 270))):
            Circle(SKETCH24_R)
        with Locations(Location((-0.125102996, 3.6, 0), (0, 0, 90))):
            Circle(SKETCH24_R)
        with Locations(Location((-0.125102996, -3.6, 0), (0, 0, 270))):
            Circle(SKETCH24_R)
        with Locations(Location((-6.375102996, -3.6, 0), (0, 0, 90))):
            Circle(SKETCH24_R)
    extrude(amount=-CUT_EXTRUDE4_DEPTH, mode=Mode.SUBTRACT)


solid = part.part
